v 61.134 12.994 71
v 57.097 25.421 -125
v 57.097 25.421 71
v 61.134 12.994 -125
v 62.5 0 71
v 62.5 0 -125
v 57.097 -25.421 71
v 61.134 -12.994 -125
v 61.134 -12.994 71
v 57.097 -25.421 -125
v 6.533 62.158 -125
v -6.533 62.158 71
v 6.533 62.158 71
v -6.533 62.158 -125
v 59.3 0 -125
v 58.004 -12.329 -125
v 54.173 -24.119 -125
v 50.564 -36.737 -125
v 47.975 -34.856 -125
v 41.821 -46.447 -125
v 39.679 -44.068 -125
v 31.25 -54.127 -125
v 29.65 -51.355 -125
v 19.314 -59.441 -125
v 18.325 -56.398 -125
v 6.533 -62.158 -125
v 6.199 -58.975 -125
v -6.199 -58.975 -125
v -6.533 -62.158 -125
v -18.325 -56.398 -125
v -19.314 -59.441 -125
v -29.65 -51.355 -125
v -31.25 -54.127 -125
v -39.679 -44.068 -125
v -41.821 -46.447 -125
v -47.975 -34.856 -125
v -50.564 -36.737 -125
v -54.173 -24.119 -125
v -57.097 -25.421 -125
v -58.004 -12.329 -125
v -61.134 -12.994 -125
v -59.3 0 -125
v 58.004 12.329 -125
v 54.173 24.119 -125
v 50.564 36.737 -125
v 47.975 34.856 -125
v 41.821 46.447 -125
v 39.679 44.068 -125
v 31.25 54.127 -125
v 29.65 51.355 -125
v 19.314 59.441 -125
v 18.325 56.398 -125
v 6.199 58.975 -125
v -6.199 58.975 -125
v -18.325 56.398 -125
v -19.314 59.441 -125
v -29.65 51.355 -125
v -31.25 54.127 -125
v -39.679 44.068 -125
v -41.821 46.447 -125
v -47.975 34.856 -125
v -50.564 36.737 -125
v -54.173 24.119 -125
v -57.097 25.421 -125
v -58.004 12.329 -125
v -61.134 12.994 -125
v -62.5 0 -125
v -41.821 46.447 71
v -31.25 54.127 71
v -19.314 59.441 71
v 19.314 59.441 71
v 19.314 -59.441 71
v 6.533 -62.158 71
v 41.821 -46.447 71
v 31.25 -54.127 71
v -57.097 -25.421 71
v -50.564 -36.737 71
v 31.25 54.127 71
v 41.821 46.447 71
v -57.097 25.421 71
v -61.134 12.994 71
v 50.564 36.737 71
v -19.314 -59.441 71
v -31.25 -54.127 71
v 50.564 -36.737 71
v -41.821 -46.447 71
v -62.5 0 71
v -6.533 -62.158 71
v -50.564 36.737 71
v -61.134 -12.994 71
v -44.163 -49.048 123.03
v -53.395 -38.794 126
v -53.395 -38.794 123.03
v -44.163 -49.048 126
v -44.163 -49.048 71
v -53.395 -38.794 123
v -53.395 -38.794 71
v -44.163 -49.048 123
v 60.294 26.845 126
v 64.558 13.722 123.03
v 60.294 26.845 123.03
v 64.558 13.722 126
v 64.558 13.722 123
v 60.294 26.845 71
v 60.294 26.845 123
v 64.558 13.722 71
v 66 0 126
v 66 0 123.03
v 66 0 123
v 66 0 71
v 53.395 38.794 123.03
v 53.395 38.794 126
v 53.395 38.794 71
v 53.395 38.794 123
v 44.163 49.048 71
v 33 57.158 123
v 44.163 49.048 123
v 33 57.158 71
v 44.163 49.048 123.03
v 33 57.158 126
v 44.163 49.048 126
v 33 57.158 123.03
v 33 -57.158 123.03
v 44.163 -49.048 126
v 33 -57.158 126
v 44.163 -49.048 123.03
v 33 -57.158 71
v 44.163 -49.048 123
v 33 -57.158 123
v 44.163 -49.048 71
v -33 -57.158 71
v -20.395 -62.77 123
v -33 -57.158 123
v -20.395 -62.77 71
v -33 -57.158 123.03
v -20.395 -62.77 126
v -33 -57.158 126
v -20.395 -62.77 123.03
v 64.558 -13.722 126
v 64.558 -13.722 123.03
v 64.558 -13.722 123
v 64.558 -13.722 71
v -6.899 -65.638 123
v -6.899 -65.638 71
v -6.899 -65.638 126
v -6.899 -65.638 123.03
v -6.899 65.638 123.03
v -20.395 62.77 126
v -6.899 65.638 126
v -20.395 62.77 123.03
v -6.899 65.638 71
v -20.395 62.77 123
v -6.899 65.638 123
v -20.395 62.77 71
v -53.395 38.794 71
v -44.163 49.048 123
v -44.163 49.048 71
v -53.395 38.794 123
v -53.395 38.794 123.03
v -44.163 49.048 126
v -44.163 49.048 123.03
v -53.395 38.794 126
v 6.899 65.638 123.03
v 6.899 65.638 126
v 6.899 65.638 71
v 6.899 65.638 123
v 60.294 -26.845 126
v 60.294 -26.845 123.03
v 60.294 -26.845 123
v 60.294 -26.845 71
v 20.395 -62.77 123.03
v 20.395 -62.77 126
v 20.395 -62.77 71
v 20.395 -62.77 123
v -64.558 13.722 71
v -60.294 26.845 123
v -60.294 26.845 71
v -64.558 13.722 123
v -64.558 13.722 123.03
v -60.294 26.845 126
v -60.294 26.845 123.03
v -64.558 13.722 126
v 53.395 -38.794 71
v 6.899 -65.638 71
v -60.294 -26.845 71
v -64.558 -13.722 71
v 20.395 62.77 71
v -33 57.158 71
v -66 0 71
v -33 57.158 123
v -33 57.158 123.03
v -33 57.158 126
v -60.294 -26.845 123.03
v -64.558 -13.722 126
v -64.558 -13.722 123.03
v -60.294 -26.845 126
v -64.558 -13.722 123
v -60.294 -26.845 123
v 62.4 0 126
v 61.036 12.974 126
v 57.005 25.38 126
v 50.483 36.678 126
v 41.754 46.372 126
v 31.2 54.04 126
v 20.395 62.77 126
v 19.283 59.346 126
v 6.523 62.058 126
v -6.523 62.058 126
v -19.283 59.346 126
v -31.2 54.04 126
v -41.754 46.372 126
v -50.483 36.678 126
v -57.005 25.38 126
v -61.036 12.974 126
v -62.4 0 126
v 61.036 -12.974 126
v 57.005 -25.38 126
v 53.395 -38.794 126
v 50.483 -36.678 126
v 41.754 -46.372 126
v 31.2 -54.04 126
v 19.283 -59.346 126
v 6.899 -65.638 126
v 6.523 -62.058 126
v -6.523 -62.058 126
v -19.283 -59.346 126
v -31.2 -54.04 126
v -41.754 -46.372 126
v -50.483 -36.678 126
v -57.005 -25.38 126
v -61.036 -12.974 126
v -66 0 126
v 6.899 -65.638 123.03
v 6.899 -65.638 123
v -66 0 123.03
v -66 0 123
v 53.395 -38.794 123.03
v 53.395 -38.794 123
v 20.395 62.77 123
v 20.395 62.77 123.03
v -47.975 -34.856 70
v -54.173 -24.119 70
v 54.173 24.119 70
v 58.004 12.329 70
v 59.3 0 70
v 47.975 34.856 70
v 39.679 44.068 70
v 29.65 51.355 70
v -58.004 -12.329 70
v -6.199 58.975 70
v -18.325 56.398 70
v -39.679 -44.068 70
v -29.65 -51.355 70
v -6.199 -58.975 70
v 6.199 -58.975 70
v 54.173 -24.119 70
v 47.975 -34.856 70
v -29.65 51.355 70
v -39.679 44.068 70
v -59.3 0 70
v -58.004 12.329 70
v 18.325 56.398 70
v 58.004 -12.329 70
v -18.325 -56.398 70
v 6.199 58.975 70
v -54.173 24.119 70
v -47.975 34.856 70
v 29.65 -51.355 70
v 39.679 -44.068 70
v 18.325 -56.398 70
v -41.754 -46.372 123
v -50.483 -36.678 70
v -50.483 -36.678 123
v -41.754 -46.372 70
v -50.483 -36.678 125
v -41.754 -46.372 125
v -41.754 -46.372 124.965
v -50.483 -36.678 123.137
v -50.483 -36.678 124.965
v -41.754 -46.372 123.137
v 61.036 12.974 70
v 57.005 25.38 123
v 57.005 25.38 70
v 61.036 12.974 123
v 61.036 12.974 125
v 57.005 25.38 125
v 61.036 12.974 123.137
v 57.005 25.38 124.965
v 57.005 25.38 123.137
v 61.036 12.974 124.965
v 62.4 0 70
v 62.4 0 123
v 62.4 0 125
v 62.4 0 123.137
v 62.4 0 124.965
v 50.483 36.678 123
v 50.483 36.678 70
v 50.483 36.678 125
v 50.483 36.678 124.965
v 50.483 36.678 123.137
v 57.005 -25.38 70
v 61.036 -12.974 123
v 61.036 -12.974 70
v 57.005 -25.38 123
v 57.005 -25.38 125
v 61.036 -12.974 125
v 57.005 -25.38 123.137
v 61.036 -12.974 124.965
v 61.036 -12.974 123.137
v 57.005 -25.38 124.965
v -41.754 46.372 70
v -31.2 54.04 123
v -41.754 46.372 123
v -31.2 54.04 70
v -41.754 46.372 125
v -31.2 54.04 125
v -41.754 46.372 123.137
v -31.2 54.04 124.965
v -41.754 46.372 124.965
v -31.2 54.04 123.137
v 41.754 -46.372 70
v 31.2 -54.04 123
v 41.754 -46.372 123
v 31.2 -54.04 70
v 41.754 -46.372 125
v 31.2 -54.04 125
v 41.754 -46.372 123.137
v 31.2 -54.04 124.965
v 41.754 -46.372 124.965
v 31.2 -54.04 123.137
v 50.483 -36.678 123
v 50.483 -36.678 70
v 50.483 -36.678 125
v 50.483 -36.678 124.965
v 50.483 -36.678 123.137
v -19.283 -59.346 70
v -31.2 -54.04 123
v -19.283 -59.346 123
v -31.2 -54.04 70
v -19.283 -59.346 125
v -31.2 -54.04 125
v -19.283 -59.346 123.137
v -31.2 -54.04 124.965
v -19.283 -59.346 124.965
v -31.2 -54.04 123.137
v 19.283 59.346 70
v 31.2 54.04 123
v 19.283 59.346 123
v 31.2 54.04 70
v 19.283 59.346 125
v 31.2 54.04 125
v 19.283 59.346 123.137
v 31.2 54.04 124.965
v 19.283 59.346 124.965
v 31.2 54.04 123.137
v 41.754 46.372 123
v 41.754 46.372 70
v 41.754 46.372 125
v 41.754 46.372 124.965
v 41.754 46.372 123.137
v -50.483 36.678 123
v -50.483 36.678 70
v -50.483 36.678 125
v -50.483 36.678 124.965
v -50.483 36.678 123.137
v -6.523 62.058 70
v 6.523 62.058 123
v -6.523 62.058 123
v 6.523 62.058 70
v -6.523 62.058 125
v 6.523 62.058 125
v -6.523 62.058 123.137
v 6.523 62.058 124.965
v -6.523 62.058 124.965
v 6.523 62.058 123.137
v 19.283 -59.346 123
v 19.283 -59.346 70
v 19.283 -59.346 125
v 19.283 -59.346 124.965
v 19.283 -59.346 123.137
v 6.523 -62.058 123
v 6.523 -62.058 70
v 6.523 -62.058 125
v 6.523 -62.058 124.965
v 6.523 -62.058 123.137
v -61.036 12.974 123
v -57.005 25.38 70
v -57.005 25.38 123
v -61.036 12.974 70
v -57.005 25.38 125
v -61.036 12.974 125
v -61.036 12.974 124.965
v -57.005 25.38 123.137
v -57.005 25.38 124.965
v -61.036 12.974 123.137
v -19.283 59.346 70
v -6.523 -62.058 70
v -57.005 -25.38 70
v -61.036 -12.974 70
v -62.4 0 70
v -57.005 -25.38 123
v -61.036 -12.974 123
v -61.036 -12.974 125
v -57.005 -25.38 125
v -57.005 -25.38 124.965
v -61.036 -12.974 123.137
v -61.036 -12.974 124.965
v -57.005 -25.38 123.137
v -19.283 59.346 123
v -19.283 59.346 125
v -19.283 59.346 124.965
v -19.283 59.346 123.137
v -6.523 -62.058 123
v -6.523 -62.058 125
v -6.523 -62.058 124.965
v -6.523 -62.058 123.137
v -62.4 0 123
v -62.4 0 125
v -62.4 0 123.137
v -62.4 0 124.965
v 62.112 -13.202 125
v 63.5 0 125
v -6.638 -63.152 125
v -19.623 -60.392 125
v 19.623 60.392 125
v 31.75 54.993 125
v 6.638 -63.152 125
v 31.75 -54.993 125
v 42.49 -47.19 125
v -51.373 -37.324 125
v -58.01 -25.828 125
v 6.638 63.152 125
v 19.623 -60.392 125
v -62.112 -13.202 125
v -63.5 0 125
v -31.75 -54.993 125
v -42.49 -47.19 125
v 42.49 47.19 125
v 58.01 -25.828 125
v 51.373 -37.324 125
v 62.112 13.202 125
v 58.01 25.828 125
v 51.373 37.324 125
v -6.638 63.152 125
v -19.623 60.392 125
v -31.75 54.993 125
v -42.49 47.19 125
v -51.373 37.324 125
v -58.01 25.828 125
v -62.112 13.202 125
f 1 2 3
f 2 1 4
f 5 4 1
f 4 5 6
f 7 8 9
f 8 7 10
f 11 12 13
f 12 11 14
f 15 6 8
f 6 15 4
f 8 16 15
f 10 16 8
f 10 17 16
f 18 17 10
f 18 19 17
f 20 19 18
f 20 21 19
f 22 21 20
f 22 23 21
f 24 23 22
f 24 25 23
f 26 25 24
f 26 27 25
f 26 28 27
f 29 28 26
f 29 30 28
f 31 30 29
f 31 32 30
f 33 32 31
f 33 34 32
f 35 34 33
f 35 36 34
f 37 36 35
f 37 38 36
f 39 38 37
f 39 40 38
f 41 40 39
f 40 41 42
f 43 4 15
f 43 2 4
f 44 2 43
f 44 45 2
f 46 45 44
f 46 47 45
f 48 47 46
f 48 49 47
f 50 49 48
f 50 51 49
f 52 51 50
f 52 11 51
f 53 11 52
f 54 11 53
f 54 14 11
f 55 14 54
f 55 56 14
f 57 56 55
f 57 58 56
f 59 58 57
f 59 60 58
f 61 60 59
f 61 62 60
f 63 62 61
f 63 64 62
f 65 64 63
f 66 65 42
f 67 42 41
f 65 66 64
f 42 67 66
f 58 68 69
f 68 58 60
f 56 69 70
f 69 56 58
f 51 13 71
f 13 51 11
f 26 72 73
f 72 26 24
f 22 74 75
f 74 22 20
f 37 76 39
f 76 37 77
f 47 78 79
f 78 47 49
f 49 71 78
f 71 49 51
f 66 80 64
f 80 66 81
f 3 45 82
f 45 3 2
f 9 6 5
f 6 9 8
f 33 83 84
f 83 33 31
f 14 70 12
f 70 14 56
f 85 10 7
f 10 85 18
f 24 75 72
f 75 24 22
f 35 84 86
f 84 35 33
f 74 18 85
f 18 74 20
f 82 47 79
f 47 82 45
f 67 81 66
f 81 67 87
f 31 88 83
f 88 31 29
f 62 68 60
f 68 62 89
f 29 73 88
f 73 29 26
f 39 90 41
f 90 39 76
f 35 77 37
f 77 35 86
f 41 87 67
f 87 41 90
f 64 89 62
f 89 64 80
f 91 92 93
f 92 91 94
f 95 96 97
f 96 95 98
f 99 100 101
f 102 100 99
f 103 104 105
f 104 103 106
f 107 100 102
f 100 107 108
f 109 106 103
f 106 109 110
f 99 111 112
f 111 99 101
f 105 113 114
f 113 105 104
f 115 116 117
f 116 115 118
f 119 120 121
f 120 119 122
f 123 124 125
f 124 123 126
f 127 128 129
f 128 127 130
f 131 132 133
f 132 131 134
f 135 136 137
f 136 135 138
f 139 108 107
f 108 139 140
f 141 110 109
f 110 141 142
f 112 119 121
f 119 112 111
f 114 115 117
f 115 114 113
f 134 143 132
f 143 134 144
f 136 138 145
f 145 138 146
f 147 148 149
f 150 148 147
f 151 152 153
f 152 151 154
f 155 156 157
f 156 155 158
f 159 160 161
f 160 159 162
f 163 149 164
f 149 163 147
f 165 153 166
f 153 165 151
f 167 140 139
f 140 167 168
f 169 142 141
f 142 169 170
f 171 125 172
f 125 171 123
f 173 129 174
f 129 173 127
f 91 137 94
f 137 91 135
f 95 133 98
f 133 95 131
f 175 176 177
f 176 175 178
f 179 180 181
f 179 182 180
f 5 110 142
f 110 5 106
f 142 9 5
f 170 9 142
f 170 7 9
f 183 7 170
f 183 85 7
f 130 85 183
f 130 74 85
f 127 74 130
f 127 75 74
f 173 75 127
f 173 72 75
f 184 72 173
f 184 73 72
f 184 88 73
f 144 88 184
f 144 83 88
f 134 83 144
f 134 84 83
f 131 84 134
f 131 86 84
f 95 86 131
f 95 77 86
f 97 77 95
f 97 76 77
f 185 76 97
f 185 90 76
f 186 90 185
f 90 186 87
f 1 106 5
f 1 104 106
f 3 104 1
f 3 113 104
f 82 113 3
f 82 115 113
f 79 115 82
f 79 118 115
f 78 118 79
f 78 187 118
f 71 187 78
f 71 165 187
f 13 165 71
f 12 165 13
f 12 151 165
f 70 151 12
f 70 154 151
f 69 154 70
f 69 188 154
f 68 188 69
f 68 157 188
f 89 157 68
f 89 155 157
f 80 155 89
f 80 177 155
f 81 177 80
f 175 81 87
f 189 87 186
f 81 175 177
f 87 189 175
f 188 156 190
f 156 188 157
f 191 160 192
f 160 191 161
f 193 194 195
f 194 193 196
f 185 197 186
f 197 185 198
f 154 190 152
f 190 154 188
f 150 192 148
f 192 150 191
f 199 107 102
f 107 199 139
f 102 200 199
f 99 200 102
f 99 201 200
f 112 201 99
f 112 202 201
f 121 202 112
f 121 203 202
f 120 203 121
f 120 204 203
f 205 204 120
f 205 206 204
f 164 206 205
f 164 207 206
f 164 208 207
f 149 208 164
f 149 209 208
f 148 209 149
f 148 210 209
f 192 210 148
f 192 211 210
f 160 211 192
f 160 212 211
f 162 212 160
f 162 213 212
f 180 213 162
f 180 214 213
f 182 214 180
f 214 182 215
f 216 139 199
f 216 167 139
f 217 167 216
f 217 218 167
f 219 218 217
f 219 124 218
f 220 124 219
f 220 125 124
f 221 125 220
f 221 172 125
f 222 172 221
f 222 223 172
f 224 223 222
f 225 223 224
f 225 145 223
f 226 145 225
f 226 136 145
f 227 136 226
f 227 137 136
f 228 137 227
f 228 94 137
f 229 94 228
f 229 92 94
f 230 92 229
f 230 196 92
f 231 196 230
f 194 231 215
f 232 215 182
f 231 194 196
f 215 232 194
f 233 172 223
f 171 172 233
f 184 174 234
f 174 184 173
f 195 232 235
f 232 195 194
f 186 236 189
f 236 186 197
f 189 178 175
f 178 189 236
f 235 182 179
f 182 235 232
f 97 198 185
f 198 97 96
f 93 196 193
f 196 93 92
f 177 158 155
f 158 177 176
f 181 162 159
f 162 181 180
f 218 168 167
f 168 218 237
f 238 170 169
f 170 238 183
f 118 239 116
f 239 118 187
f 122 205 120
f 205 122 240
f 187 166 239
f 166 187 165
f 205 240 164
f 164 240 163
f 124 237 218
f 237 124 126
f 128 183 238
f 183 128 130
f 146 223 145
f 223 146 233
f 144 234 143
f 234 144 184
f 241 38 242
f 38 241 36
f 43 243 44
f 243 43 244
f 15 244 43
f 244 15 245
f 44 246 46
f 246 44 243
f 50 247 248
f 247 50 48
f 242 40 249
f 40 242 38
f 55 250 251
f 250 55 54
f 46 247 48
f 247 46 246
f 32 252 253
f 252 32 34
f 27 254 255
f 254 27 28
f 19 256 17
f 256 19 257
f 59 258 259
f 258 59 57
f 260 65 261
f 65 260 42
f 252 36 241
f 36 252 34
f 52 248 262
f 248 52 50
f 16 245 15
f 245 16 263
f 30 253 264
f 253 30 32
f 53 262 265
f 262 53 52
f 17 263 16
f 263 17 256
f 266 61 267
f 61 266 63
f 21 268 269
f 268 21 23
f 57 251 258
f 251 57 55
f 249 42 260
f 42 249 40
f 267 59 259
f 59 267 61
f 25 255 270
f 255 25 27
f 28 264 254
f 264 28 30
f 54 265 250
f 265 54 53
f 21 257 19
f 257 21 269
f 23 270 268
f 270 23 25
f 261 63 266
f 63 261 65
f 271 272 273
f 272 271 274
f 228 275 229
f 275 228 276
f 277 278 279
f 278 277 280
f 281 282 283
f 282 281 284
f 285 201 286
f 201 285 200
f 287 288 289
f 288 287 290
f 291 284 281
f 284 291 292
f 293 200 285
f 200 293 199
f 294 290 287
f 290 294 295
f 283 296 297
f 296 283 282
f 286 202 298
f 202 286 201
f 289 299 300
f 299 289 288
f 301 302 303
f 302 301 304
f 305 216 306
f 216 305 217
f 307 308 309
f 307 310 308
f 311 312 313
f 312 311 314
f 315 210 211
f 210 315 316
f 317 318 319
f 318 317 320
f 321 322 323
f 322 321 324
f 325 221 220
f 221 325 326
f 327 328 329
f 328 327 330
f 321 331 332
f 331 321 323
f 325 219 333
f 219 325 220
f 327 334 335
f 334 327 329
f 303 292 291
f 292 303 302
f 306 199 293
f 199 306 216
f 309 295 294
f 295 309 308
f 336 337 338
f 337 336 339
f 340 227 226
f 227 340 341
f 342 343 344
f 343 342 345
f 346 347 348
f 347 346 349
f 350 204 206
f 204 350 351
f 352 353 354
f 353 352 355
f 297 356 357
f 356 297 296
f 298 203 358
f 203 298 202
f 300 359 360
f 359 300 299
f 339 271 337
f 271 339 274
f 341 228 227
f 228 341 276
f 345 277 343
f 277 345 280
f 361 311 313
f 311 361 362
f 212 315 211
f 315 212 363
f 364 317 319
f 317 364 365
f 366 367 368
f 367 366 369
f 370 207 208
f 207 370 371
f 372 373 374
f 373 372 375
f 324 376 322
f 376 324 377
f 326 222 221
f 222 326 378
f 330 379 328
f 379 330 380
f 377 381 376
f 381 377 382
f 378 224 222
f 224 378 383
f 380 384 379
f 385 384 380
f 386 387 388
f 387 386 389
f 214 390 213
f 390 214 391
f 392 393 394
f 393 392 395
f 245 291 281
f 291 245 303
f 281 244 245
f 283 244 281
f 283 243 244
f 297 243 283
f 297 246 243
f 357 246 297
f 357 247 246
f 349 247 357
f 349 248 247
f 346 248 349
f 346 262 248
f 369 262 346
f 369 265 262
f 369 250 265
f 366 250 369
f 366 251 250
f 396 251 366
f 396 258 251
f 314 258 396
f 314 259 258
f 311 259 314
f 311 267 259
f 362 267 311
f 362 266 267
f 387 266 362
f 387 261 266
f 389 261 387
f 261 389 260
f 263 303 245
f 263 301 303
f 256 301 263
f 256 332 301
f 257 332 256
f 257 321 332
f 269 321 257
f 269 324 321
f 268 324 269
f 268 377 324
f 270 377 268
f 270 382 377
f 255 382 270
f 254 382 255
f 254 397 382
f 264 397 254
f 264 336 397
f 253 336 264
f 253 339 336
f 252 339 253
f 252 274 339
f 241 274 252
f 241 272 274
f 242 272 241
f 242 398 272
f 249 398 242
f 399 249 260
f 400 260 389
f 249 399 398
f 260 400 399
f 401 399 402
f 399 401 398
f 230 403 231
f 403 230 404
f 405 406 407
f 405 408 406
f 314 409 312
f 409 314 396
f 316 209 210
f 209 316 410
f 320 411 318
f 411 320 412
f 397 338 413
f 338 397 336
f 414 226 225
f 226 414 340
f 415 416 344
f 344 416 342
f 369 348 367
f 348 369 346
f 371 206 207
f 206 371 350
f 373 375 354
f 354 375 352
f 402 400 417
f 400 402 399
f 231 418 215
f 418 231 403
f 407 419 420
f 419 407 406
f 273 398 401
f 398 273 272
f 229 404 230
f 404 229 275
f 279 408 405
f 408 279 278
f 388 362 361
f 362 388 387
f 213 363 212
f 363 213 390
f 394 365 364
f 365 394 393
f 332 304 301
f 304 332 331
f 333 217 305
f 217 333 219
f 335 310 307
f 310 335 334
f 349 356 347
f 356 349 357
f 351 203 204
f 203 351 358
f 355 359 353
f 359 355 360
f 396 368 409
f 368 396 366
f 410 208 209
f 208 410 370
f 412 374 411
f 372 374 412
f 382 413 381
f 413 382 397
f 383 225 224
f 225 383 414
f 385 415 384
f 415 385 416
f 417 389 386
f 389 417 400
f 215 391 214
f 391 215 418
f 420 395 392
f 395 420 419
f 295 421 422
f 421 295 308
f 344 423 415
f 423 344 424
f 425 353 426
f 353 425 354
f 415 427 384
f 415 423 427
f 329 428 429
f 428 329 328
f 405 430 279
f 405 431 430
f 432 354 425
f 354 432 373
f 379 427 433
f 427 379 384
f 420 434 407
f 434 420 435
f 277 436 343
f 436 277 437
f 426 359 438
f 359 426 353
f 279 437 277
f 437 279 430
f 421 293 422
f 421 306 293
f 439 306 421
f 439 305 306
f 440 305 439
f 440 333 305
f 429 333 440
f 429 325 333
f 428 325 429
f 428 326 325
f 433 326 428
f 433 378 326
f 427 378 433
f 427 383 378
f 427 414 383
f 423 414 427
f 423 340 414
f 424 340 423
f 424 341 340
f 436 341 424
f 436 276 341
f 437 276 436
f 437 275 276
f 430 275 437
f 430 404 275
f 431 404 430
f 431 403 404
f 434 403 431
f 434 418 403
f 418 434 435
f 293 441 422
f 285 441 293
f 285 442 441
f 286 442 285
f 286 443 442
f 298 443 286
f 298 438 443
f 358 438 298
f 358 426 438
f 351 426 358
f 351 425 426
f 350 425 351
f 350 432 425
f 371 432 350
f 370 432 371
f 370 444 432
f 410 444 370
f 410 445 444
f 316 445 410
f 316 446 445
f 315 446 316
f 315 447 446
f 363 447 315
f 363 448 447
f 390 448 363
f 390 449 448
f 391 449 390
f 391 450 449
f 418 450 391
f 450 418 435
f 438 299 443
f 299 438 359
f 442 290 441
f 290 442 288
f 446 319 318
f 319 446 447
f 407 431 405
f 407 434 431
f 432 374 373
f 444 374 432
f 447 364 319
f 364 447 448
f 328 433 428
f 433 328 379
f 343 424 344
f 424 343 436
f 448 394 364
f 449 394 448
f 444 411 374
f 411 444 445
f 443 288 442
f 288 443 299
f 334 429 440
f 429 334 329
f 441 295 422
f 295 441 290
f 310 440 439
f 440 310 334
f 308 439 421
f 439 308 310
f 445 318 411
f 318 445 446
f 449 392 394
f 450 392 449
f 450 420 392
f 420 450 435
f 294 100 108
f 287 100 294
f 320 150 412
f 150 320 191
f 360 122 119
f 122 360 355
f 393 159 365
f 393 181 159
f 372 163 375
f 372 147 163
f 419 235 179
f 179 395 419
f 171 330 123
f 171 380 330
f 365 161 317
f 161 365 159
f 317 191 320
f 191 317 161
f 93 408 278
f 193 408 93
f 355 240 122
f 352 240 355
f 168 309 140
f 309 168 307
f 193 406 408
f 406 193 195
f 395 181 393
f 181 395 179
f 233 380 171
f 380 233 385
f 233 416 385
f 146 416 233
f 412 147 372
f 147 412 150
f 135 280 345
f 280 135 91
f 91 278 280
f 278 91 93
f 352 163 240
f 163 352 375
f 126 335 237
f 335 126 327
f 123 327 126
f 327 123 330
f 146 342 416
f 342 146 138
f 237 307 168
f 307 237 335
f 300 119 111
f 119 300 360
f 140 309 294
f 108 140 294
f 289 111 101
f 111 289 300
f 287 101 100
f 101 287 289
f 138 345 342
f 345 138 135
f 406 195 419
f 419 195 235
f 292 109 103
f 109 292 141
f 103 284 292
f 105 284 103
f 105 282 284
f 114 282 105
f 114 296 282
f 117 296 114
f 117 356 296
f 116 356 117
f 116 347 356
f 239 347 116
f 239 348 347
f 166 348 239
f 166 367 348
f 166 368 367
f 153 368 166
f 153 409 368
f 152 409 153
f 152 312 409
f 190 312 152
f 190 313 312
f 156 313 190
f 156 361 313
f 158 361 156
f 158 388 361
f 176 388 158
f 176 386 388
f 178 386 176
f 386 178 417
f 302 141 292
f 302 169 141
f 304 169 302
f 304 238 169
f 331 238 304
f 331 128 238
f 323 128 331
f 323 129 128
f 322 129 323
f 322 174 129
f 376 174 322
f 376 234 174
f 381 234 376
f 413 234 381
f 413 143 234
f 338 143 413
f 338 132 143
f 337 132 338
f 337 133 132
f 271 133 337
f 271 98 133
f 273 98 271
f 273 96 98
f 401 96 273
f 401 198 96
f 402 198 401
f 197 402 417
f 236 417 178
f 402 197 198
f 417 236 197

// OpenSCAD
// Parameters
pipe_length = 250; //[125:500:1]
outer_diameter = 125; //[62.5:250:0.5]
wall_thickness = 3.2; //[1.6:6.4:0.1]
socket_length = 55; //[30:110:1]
socket_outer_diameter = 132; //[126:160:0.5]
socket_wall_thickness = 3.6; //[2:7.2:0.1]
chamfer_length = 2; //[1:6:0.5]
marking_band_width = 6; //[2:15:0.5]
marking_band_depth = 0.4; //[0.1:1.2:0.1]
overlap = 1; //[0.5:2:0.1]

// Base Shapes
module pipe_body() {
  cylinder(h=pipe_length, r=outer_diameter/2, center=true);
}

module inner_bore() {
  cylinder(h=pipe_length + 2*overlap, r=outer_diameter/2 - wall_thickness, center=true);
}

module socket_end() {
  cylinder(h=socket_length, r=socket_outer_diameter/2, center=true);
}

module socket_inner_bore() {
  cylinder(h=socket_length + 2*overlap, r=socket_outer_diameter/2 - socket_wall_thickness, center=true);
}

module chamfer_cut_spigot_outer() {
  rotate([180, 0, 0])
    translate([0, 0, -pipe_length/2 + chamfer_length/2])
      cylinder(h=chamfer_length, r1=outer_diameter/2 + overlap, r2=0, center=true);
}

module chamfer_cut_spigot_inner() {
  rotate([180, 0, 0])
    translate([0, 0, -pipe_length/2 + chamfer_length/2])
      cylinder(h=chamfer_length, r1=outer_diameter/2 - wall_thickness + overlap, r2=0, center=true);
}

module chamfer_cut_socket_outer() {
  translate([0, 0, pipe_length/2 - chamfer_length/2])
    cylinder(h=chamfer_length, r1=socket_outer_diameter/2 + overlap, r2=0, center=true);
}

module chamfer_cut_socket_inner() {
  translate([0, 0, pipe_length/2 - chamfer_length/2])
    cylinder(h=chamfer_length, r1=socket_outer_diameter/2 - socket_wall_thickness + overlap, r2=0, center=true);
}

module marking_band_1_outer() {
  translate([0, 0, -pipe_length/2 + socket_length + marking_band_width/2])
    cylinder(h=marking_band_width, r=outer_diameter/2, center=true);
}

module marking_band_1_inner() {
  translate([0, 0, -pipe_length/2 + socket_length + marking_band_width/2])
    cylinder(h=marking_band_width + 2*overlap, r=outer_diameter/2 - marking_band_depth, center=true);
}

module marking_band_2_outer() {
  translate([0, 0, pipe_length/2 - socket_length - marking_band_width/2])
    cylinder(h=marking_band_width, r=outer_diameter/2, center=true);
}

module marking_band_2_inner() {
  translate([0, 0, pipe_length/2 - socket_length - marking_band_width/2])
    cylinder(h=marking_band_width + 2*overlap, r=outer_diameter/2 - marking_band_depth, center=true);
}

// Operations
module outer_union() {
  union() {
    pipe_body();
    translate([0, 0, pipe_length/2 - socket_length/2 + overlap]) socket_end();
  }
}

module bore_union() {
  union() {
    inner_bore();
    translate([0, 0, pipe_length/2 - socket_length/2 + overlap]) socket_inner_bore();
  }
}

module marking_band_1_diff() {
  difference() {
    marking_band_1_outer();
    marking_band_1_inner();
  }
}

module marking_band_2_diff() {
  difference() {
    marking_band_2_outer();
    marking_band_2_inner();
  }
}

module markings_union() {
  union() {
    marking_band_1_diff();
    marking_band_2_diff();
  }
}

module outer_with_markings() {
  union() {
    outer_union();
    markings_union();
  }
}

module chamfers_union() {
  union() {
    chamfer_cut_spigot_outer();
    chamfer_cut_spigot_inner();
    chamfer_cut_socket_outer();
    chamfer_cut_socket_inner();
  }
}

module pipe_hollowed() {
  difference() {
    outer_with_markings();
    bore_union();
  }
}

module pipe_final() {
  difference() {
    pipe_hollowed();
    chamfers_union();
  }
}

// Final Output
pipe_final();
